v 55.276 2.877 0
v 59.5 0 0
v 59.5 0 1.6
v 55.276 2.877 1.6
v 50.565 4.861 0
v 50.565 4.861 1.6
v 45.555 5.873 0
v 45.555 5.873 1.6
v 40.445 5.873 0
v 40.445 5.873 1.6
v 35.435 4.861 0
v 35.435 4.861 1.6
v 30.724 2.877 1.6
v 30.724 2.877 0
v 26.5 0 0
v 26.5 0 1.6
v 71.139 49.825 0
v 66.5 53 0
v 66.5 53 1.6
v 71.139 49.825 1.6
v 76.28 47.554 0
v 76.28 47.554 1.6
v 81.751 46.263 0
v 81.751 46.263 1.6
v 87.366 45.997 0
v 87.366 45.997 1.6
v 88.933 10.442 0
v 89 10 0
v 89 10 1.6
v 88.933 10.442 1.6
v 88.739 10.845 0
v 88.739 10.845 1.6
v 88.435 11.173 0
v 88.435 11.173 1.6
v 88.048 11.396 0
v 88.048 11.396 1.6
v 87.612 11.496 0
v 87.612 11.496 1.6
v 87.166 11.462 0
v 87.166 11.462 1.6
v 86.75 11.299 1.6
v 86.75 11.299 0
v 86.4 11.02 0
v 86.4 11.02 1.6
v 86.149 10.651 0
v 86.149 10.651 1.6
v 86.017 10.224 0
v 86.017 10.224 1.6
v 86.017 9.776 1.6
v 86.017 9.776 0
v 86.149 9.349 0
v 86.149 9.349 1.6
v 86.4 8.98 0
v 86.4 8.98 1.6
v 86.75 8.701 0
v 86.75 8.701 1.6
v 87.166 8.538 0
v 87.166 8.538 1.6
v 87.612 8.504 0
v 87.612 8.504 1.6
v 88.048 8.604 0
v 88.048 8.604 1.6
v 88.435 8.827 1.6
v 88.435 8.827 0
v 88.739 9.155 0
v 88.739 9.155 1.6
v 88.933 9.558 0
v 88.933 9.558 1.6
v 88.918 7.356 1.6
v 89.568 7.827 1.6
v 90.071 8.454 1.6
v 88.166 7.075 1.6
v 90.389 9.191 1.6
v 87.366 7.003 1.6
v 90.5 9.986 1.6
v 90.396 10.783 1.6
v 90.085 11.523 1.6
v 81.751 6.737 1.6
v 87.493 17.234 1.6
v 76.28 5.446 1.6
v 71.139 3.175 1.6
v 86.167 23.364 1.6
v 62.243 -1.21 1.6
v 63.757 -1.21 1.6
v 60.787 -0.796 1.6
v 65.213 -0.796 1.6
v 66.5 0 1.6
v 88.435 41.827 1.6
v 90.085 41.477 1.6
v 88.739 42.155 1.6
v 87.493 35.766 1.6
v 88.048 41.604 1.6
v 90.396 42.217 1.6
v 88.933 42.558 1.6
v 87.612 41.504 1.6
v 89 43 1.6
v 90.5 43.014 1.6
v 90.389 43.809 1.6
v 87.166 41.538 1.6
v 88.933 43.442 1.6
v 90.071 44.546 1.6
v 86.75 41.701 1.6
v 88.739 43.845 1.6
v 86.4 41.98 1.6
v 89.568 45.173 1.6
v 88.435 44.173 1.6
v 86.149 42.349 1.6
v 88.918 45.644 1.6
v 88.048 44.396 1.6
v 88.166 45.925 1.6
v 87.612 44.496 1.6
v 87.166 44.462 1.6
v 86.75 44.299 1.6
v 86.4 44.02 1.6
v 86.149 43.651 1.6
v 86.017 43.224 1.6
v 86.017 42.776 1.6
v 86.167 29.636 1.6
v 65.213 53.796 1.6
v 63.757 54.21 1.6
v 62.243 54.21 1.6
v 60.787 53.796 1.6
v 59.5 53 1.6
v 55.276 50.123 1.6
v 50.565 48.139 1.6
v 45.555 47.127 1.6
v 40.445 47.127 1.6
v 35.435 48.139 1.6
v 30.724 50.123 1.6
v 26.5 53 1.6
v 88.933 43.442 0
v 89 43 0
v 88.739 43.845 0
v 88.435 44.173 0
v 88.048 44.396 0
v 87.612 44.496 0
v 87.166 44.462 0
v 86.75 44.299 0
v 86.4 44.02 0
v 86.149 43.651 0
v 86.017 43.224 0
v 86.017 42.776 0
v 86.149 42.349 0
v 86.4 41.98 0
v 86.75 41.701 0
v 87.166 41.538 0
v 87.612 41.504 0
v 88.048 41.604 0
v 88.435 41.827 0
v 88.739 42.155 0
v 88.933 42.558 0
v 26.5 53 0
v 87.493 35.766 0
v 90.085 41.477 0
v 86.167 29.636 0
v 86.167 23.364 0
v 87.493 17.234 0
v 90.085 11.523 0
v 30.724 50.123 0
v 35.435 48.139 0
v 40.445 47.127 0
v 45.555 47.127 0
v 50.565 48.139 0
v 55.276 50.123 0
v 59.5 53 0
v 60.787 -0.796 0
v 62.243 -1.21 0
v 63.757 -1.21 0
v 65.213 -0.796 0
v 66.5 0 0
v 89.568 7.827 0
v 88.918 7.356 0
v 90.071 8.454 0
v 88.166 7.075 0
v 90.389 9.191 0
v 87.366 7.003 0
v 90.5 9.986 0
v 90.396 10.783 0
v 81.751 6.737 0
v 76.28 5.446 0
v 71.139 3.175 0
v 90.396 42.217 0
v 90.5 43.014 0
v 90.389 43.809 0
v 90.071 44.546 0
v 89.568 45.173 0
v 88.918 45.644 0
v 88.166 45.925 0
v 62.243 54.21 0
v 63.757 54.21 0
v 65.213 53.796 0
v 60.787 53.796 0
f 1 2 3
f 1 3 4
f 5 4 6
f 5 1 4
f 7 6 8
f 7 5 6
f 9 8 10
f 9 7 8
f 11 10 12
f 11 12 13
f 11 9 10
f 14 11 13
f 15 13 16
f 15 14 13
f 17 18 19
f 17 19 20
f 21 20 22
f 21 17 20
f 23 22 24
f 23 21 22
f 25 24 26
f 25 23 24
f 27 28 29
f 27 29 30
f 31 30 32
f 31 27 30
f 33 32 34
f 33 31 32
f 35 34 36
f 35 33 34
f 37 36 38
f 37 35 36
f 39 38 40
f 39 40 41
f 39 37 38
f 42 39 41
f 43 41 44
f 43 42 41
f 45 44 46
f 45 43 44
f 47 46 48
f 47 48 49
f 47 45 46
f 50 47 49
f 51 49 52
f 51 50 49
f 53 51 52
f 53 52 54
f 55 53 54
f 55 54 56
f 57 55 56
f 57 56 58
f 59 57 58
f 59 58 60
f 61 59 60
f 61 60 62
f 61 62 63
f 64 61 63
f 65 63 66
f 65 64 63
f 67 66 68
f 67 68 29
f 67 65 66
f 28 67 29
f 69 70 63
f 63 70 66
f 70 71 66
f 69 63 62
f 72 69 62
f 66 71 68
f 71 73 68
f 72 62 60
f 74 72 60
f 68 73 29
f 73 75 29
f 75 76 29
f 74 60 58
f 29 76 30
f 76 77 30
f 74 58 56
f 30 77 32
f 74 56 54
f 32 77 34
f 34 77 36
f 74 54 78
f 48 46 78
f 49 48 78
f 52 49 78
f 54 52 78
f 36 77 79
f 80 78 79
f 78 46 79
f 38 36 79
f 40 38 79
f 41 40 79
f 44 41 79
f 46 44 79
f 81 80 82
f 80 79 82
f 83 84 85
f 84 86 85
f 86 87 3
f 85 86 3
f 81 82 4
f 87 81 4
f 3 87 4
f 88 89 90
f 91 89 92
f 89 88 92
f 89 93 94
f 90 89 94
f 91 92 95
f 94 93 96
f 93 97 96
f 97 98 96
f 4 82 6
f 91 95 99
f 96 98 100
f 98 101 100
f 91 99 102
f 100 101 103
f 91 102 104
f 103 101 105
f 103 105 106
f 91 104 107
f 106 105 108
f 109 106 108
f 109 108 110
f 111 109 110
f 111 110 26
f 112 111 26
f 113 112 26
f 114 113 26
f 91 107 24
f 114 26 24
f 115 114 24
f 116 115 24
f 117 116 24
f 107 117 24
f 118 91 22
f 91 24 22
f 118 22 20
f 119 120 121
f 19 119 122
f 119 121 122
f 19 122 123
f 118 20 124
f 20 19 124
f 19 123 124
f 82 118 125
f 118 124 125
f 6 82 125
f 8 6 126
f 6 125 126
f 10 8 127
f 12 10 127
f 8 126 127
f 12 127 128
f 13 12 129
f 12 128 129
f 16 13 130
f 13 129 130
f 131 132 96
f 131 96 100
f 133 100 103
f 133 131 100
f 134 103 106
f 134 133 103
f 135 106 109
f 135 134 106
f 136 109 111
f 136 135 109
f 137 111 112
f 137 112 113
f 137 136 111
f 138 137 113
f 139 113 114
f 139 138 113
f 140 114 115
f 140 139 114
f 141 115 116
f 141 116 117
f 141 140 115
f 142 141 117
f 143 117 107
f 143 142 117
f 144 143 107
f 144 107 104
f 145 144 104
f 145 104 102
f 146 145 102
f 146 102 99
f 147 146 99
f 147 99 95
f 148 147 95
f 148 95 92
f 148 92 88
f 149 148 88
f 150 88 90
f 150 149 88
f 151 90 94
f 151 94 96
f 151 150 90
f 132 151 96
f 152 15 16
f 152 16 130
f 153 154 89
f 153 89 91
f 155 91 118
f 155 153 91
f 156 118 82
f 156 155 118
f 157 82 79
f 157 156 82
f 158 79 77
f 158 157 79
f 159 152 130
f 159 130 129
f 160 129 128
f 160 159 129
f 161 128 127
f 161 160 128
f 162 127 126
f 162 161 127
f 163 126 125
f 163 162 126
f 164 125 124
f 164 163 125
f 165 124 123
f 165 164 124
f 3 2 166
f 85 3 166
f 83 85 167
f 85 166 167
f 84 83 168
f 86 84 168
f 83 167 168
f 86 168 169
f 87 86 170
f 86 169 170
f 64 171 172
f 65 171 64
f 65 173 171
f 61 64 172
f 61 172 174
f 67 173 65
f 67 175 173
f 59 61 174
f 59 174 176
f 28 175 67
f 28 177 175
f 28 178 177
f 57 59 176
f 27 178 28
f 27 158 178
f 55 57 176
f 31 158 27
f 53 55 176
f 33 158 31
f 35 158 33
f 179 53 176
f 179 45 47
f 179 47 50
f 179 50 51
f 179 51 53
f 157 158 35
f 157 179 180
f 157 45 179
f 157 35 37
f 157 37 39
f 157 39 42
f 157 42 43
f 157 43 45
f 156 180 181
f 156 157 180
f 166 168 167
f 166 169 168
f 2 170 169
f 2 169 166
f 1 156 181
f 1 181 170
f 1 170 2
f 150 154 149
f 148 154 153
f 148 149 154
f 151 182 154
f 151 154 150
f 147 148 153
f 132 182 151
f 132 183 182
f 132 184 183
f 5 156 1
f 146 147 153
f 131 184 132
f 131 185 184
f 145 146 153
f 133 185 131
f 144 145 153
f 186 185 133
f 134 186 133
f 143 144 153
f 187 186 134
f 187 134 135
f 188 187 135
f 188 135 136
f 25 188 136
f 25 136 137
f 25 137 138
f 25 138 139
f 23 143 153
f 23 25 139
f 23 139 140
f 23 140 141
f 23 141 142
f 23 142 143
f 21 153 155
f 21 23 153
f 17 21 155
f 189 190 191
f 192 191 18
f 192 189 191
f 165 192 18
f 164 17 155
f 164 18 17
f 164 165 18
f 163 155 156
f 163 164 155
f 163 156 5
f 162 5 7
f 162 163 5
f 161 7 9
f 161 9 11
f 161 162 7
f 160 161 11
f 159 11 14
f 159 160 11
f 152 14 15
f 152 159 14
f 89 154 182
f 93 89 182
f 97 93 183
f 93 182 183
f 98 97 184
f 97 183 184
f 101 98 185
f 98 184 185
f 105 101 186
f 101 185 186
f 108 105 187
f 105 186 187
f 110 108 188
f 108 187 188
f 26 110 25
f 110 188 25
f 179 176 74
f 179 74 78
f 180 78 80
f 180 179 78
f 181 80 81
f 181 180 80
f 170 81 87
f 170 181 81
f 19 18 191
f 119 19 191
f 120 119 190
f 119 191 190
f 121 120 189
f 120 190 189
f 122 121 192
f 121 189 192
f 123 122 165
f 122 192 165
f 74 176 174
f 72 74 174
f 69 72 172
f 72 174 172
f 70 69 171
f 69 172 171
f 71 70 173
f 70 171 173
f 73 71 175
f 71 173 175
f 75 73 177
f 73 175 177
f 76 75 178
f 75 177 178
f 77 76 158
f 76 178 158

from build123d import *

# Parameters (mm, degrees)
SKETCH_R  = 1.5
PAD_DEPTH = 1.6


with BuildPart() as part:
    # Sketch → Pad (new body)
    with BuildSketch(Plane.XY):
        with BuildLine():
            ThreePointArc((59.5, 0), (43, 6), (26.5, 0))
            Line((26.5, 0), (26.5, 53))
            ThreePointArc((26.5, 53), (43, 47), (59.5, 53))
            ThreePointArc((66.5, 53), (63, 54.262411), (59.5, 53))
            ThreePointArc((66.5, 53), (76.280312, 47.553998), (87.365852, 45.996999))
            ThreePointArc((90.084619, 41.47693), (90.070775, 44.54629), (87.365852, 45.996999))
            ThreePointArc((90.084619, 41.47693), (86, 26.500006), (90.084613, 11.523081))
            ThreePointArc((87.365857, 7.003001), (90.070792, 8.45371), (90.084613, 11.523081))
            ThreePointArc((87.365857, 7.003001), (76.280314, 5.446003), (66.5, 0))
            ThreePointArc((59.5, 0), (63, -1.262442), (66.5, 0))
        make_face()
        with Locations((87.5, 43)):
            Circle(SKETCH_R, mode=Mode.SUBTRACT)
        with Locations((87.5, 10)):
            Circle(SKETCH_R, mode=Mode.SUBTRACT)
    extrude(amount=PAD_DEPTH)


solid = part.part
